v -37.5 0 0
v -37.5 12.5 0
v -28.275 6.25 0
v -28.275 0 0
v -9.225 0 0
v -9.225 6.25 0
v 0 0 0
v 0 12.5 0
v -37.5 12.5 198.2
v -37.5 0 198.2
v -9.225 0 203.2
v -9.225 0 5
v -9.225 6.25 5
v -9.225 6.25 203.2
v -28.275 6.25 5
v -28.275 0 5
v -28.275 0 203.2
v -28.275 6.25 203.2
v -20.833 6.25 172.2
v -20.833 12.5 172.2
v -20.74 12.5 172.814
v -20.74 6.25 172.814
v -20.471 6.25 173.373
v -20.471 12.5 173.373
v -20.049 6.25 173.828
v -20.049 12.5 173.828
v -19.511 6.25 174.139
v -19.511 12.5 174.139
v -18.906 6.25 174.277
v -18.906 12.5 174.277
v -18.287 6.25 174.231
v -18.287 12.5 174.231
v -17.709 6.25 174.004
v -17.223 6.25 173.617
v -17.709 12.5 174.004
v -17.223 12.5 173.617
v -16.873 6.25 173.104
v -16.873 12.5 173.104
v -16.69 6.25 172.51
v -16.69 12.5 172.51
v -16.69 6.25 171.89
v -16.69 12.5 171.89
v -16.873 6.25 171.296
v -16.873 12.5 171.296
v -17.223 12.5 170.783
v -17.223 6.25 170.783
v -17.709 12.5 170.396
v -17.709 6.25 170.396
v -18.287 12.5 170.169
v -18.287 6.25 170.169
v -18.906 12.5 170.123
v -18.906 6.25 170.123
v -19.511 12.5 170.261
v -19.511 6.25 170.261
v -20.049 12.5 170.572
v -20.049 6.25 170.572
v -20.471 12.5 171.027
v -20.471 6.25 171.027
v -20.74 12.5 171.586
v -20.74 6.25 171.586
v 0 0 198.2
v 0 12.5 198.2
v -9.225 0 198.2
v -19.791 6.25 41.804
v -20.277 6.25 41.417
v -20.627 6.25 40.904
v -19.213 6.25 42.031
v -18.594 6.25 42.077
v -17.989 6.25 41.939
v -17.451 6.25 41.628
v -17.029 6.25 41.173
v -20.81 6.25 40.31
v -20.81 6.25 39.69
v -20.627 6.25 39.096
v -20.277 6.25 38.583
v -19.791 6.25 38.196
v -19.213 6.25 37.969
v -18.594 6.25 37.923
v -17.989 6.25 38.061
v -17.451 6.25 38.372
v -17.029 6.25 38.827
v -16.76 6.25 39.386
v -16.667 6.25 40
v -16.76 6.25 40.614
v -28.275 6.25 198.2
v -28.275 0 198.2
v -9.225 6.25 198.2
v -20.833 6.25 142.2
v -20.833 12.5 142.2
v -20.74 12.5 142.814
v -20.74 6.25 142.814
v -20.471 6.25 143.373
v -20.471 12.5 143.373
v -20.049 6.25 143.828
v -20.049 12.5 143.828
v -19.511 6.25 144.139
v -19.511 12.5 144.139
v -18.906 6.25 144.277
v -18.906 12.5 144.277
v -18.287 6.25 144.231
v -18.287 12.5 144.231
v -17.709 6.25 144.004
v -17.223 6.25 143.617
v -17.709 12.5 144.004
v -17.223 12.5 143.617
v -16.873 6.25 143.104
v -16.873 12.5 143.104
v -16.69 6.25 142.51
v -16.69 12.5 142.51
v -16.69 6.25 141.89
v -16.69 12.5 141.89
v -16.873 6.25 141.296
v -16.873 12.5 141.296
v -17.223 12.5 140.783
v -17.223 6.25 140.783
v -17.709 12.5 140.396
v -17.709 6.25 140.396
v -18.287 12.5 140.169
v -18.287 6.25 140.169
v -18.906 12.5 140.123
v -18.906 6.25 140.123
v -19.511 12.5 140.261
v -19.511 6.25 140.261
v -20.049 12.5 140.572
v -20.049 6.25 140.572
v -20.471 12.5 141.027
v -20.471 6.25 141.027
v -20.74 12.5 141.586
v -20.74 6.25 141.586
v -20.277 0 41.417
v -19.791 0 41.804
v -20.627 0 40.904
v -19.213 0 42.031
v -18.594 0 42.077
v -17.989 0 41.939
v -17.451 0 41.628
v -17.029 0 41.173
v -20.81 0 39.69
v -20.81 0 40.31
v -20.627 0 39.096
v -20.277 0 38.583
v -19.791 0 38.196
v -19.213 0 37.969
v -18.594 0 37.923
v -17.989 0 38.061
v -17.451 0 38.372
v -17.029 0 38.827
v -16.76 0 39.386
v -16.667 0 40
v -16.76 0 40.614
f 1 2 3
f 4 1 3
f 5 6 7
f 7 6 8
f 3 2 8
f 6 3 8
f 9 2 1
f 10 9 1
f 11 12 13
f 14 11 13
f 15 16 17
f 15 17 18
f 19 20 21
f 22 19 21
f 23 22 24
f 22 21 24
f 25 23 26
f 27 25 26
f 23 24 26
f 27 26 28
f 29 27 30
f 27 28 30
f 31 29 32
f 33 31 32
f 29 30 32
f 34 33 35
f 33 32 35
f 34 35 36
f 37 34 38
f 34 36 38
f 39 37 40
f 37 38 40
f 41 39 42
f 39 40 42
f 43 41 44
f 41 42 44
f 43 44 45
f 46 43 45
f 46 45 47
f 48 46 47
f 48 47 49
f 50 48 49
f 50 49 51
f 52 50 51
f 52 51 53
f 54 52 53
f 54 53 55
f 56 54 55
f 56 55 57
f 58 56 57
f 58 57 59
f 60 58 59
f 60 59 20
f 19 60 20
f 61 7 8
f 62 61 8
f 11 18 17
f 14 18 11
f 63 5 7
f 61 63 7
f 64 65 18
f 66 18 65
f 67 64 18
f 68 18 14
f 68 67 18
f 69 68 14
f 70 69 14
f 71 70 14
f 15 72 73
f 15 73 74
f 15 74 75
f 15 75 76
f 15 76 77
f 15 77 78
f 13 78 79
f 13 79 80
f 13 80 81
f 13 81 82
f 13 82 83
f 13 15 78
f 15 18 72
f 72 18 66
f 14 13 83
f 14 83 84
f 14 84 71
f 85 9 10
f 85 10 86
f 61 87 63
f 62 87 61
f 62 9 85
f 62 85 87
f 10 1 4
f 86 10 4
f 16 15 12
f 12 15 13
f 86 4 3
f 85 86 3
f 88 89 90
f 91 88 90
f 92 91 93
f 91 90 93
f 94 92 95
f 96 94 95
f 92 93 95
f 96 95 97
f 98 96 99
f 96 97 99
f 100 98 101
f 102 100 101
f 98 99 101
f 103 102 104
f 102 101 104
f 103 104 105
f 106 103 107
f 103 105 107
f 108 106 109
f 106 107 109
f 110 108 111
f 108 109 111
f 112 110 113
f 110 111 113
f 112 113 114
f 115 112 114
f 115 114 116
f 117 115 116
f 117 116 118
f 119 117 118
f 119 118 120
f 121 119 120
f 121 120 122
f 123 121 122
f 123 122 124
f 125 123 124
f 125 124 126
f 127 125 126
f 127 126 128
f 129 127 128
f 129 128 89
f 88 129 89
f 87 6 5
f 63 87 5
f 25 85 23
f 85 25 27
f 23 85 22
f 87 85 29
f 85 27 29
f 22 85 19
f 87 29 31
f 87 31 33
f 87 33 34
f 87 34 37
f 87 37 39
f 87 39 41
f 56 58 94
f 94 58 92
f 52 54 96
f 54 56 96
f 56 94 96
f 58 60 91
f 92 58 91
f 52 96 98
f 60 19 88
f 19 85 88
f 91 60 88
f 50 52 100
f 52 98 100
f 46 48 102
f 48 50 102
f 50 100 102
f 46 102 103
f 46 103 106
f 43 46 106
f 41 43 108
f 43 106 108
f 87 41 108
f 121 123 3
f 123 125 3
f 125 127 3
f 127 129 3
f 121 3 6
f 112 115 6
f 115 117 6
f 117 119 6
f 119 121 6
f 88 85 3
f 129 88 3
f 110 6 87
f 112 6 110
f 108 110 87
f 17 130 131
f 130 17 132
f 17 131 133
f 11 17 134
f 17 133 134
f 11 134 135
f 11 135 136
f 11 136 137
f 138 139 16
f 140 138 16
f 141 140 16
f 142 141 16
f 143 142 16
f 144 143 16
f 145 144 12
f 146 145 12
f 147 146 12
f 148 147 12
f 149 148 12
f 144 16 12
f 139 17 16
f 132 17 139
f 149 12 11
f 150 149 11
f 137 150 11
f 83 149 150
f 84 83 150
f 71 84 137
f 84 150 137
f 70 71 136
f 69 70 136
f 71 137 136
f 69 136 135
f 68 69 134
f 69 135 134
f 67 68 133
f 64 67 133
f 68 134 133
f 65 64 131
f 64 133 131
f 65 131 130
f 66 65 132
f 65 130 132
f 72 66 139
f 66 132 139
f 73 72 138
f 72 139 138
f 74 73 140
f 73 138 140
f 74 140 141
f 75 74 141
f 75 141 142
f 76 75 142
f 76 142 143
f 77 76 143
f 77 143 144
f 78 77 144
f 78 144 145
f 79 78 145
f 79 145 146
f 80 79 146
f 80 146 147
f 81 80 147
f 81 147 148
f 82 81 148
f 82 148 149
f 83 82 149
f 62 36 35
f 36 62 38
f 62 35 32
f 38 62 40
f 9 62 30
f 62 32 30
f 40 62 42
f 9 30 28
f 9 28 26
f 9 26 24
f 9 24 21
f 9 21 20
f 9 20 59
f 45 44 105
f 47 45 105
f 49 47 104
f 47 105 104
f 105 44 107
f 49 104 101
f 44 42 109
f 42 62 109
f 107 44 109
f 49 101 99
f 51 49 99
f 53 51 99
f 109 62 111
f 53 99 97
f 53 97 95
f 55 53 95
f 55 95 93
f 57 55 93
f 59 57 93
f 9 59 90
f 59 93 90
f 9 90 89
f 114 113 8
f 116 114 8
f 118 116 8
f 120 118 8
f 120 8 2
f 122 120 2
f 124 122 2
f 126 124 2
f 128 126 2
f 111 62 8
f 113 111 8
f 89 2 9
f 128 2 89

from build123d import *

# Parameters (mm, degrees)
F2_DEPTH = 198.2
F3_START = 5
F1_W     = 19.05
F1_H     = 6.25
F3_DEPTH = 198.2
F4_R     = 2.0828
F5_DEPTH = 12.501
F6_R     = 2.0828
F7_DEPTH = 25


# Not quite as in the source:
# - a feature names something its author has since deleted; it is built from what else it names


with BuildPart() as f2:
    # F1 (on Top) → F2 (new body, through all)
    with BuildSketch(Plane.XY):
        Polygon((-9.225, 0), (0, 0), (0, 12.5), (-37.5, 12.5), (-37.5, 0), (-28.275, 0), (-28.275, 6.25), (-9.225, 6.25), align=None)
    extrude(amount=F2_DEPTH)

    # F6 (on face) → F7 (cut)
    with BuildSketch(Plane(origin=(0, 12.5, 0), x_dir=(-1, 0, 0), z_dir=(0, 1, 0))):
        with Locations((18.75, 142.2)):
            Circle(F6_R)
        with Locations((18.75, 172.2)):
            Circle(F6_R)
    extrude(amount=-F7_DEPTH, mode=Mode.SUBTRACT)


with BuildPart() as f3:
    # F1 (on Top) → F3 (new body)
    with BuildSketch(Plane.XY.offset(F3_START)):
        with Locations((-18.75, 3.125)):
            Rectangle(F1_W, F1_H)
    extrude(amount=F3_DEPTH)

    # F4 (on face) → F5 (cut, through all)
    with BuildSketch(Plane.XZ):
        with Locations((-18.75, 40)):
            Circle(F4_R)
    extrude(amount=-F5_DEPTH, mode=Mode.SUBTRACT)


solid = Compound([f2.part, f3.part])
